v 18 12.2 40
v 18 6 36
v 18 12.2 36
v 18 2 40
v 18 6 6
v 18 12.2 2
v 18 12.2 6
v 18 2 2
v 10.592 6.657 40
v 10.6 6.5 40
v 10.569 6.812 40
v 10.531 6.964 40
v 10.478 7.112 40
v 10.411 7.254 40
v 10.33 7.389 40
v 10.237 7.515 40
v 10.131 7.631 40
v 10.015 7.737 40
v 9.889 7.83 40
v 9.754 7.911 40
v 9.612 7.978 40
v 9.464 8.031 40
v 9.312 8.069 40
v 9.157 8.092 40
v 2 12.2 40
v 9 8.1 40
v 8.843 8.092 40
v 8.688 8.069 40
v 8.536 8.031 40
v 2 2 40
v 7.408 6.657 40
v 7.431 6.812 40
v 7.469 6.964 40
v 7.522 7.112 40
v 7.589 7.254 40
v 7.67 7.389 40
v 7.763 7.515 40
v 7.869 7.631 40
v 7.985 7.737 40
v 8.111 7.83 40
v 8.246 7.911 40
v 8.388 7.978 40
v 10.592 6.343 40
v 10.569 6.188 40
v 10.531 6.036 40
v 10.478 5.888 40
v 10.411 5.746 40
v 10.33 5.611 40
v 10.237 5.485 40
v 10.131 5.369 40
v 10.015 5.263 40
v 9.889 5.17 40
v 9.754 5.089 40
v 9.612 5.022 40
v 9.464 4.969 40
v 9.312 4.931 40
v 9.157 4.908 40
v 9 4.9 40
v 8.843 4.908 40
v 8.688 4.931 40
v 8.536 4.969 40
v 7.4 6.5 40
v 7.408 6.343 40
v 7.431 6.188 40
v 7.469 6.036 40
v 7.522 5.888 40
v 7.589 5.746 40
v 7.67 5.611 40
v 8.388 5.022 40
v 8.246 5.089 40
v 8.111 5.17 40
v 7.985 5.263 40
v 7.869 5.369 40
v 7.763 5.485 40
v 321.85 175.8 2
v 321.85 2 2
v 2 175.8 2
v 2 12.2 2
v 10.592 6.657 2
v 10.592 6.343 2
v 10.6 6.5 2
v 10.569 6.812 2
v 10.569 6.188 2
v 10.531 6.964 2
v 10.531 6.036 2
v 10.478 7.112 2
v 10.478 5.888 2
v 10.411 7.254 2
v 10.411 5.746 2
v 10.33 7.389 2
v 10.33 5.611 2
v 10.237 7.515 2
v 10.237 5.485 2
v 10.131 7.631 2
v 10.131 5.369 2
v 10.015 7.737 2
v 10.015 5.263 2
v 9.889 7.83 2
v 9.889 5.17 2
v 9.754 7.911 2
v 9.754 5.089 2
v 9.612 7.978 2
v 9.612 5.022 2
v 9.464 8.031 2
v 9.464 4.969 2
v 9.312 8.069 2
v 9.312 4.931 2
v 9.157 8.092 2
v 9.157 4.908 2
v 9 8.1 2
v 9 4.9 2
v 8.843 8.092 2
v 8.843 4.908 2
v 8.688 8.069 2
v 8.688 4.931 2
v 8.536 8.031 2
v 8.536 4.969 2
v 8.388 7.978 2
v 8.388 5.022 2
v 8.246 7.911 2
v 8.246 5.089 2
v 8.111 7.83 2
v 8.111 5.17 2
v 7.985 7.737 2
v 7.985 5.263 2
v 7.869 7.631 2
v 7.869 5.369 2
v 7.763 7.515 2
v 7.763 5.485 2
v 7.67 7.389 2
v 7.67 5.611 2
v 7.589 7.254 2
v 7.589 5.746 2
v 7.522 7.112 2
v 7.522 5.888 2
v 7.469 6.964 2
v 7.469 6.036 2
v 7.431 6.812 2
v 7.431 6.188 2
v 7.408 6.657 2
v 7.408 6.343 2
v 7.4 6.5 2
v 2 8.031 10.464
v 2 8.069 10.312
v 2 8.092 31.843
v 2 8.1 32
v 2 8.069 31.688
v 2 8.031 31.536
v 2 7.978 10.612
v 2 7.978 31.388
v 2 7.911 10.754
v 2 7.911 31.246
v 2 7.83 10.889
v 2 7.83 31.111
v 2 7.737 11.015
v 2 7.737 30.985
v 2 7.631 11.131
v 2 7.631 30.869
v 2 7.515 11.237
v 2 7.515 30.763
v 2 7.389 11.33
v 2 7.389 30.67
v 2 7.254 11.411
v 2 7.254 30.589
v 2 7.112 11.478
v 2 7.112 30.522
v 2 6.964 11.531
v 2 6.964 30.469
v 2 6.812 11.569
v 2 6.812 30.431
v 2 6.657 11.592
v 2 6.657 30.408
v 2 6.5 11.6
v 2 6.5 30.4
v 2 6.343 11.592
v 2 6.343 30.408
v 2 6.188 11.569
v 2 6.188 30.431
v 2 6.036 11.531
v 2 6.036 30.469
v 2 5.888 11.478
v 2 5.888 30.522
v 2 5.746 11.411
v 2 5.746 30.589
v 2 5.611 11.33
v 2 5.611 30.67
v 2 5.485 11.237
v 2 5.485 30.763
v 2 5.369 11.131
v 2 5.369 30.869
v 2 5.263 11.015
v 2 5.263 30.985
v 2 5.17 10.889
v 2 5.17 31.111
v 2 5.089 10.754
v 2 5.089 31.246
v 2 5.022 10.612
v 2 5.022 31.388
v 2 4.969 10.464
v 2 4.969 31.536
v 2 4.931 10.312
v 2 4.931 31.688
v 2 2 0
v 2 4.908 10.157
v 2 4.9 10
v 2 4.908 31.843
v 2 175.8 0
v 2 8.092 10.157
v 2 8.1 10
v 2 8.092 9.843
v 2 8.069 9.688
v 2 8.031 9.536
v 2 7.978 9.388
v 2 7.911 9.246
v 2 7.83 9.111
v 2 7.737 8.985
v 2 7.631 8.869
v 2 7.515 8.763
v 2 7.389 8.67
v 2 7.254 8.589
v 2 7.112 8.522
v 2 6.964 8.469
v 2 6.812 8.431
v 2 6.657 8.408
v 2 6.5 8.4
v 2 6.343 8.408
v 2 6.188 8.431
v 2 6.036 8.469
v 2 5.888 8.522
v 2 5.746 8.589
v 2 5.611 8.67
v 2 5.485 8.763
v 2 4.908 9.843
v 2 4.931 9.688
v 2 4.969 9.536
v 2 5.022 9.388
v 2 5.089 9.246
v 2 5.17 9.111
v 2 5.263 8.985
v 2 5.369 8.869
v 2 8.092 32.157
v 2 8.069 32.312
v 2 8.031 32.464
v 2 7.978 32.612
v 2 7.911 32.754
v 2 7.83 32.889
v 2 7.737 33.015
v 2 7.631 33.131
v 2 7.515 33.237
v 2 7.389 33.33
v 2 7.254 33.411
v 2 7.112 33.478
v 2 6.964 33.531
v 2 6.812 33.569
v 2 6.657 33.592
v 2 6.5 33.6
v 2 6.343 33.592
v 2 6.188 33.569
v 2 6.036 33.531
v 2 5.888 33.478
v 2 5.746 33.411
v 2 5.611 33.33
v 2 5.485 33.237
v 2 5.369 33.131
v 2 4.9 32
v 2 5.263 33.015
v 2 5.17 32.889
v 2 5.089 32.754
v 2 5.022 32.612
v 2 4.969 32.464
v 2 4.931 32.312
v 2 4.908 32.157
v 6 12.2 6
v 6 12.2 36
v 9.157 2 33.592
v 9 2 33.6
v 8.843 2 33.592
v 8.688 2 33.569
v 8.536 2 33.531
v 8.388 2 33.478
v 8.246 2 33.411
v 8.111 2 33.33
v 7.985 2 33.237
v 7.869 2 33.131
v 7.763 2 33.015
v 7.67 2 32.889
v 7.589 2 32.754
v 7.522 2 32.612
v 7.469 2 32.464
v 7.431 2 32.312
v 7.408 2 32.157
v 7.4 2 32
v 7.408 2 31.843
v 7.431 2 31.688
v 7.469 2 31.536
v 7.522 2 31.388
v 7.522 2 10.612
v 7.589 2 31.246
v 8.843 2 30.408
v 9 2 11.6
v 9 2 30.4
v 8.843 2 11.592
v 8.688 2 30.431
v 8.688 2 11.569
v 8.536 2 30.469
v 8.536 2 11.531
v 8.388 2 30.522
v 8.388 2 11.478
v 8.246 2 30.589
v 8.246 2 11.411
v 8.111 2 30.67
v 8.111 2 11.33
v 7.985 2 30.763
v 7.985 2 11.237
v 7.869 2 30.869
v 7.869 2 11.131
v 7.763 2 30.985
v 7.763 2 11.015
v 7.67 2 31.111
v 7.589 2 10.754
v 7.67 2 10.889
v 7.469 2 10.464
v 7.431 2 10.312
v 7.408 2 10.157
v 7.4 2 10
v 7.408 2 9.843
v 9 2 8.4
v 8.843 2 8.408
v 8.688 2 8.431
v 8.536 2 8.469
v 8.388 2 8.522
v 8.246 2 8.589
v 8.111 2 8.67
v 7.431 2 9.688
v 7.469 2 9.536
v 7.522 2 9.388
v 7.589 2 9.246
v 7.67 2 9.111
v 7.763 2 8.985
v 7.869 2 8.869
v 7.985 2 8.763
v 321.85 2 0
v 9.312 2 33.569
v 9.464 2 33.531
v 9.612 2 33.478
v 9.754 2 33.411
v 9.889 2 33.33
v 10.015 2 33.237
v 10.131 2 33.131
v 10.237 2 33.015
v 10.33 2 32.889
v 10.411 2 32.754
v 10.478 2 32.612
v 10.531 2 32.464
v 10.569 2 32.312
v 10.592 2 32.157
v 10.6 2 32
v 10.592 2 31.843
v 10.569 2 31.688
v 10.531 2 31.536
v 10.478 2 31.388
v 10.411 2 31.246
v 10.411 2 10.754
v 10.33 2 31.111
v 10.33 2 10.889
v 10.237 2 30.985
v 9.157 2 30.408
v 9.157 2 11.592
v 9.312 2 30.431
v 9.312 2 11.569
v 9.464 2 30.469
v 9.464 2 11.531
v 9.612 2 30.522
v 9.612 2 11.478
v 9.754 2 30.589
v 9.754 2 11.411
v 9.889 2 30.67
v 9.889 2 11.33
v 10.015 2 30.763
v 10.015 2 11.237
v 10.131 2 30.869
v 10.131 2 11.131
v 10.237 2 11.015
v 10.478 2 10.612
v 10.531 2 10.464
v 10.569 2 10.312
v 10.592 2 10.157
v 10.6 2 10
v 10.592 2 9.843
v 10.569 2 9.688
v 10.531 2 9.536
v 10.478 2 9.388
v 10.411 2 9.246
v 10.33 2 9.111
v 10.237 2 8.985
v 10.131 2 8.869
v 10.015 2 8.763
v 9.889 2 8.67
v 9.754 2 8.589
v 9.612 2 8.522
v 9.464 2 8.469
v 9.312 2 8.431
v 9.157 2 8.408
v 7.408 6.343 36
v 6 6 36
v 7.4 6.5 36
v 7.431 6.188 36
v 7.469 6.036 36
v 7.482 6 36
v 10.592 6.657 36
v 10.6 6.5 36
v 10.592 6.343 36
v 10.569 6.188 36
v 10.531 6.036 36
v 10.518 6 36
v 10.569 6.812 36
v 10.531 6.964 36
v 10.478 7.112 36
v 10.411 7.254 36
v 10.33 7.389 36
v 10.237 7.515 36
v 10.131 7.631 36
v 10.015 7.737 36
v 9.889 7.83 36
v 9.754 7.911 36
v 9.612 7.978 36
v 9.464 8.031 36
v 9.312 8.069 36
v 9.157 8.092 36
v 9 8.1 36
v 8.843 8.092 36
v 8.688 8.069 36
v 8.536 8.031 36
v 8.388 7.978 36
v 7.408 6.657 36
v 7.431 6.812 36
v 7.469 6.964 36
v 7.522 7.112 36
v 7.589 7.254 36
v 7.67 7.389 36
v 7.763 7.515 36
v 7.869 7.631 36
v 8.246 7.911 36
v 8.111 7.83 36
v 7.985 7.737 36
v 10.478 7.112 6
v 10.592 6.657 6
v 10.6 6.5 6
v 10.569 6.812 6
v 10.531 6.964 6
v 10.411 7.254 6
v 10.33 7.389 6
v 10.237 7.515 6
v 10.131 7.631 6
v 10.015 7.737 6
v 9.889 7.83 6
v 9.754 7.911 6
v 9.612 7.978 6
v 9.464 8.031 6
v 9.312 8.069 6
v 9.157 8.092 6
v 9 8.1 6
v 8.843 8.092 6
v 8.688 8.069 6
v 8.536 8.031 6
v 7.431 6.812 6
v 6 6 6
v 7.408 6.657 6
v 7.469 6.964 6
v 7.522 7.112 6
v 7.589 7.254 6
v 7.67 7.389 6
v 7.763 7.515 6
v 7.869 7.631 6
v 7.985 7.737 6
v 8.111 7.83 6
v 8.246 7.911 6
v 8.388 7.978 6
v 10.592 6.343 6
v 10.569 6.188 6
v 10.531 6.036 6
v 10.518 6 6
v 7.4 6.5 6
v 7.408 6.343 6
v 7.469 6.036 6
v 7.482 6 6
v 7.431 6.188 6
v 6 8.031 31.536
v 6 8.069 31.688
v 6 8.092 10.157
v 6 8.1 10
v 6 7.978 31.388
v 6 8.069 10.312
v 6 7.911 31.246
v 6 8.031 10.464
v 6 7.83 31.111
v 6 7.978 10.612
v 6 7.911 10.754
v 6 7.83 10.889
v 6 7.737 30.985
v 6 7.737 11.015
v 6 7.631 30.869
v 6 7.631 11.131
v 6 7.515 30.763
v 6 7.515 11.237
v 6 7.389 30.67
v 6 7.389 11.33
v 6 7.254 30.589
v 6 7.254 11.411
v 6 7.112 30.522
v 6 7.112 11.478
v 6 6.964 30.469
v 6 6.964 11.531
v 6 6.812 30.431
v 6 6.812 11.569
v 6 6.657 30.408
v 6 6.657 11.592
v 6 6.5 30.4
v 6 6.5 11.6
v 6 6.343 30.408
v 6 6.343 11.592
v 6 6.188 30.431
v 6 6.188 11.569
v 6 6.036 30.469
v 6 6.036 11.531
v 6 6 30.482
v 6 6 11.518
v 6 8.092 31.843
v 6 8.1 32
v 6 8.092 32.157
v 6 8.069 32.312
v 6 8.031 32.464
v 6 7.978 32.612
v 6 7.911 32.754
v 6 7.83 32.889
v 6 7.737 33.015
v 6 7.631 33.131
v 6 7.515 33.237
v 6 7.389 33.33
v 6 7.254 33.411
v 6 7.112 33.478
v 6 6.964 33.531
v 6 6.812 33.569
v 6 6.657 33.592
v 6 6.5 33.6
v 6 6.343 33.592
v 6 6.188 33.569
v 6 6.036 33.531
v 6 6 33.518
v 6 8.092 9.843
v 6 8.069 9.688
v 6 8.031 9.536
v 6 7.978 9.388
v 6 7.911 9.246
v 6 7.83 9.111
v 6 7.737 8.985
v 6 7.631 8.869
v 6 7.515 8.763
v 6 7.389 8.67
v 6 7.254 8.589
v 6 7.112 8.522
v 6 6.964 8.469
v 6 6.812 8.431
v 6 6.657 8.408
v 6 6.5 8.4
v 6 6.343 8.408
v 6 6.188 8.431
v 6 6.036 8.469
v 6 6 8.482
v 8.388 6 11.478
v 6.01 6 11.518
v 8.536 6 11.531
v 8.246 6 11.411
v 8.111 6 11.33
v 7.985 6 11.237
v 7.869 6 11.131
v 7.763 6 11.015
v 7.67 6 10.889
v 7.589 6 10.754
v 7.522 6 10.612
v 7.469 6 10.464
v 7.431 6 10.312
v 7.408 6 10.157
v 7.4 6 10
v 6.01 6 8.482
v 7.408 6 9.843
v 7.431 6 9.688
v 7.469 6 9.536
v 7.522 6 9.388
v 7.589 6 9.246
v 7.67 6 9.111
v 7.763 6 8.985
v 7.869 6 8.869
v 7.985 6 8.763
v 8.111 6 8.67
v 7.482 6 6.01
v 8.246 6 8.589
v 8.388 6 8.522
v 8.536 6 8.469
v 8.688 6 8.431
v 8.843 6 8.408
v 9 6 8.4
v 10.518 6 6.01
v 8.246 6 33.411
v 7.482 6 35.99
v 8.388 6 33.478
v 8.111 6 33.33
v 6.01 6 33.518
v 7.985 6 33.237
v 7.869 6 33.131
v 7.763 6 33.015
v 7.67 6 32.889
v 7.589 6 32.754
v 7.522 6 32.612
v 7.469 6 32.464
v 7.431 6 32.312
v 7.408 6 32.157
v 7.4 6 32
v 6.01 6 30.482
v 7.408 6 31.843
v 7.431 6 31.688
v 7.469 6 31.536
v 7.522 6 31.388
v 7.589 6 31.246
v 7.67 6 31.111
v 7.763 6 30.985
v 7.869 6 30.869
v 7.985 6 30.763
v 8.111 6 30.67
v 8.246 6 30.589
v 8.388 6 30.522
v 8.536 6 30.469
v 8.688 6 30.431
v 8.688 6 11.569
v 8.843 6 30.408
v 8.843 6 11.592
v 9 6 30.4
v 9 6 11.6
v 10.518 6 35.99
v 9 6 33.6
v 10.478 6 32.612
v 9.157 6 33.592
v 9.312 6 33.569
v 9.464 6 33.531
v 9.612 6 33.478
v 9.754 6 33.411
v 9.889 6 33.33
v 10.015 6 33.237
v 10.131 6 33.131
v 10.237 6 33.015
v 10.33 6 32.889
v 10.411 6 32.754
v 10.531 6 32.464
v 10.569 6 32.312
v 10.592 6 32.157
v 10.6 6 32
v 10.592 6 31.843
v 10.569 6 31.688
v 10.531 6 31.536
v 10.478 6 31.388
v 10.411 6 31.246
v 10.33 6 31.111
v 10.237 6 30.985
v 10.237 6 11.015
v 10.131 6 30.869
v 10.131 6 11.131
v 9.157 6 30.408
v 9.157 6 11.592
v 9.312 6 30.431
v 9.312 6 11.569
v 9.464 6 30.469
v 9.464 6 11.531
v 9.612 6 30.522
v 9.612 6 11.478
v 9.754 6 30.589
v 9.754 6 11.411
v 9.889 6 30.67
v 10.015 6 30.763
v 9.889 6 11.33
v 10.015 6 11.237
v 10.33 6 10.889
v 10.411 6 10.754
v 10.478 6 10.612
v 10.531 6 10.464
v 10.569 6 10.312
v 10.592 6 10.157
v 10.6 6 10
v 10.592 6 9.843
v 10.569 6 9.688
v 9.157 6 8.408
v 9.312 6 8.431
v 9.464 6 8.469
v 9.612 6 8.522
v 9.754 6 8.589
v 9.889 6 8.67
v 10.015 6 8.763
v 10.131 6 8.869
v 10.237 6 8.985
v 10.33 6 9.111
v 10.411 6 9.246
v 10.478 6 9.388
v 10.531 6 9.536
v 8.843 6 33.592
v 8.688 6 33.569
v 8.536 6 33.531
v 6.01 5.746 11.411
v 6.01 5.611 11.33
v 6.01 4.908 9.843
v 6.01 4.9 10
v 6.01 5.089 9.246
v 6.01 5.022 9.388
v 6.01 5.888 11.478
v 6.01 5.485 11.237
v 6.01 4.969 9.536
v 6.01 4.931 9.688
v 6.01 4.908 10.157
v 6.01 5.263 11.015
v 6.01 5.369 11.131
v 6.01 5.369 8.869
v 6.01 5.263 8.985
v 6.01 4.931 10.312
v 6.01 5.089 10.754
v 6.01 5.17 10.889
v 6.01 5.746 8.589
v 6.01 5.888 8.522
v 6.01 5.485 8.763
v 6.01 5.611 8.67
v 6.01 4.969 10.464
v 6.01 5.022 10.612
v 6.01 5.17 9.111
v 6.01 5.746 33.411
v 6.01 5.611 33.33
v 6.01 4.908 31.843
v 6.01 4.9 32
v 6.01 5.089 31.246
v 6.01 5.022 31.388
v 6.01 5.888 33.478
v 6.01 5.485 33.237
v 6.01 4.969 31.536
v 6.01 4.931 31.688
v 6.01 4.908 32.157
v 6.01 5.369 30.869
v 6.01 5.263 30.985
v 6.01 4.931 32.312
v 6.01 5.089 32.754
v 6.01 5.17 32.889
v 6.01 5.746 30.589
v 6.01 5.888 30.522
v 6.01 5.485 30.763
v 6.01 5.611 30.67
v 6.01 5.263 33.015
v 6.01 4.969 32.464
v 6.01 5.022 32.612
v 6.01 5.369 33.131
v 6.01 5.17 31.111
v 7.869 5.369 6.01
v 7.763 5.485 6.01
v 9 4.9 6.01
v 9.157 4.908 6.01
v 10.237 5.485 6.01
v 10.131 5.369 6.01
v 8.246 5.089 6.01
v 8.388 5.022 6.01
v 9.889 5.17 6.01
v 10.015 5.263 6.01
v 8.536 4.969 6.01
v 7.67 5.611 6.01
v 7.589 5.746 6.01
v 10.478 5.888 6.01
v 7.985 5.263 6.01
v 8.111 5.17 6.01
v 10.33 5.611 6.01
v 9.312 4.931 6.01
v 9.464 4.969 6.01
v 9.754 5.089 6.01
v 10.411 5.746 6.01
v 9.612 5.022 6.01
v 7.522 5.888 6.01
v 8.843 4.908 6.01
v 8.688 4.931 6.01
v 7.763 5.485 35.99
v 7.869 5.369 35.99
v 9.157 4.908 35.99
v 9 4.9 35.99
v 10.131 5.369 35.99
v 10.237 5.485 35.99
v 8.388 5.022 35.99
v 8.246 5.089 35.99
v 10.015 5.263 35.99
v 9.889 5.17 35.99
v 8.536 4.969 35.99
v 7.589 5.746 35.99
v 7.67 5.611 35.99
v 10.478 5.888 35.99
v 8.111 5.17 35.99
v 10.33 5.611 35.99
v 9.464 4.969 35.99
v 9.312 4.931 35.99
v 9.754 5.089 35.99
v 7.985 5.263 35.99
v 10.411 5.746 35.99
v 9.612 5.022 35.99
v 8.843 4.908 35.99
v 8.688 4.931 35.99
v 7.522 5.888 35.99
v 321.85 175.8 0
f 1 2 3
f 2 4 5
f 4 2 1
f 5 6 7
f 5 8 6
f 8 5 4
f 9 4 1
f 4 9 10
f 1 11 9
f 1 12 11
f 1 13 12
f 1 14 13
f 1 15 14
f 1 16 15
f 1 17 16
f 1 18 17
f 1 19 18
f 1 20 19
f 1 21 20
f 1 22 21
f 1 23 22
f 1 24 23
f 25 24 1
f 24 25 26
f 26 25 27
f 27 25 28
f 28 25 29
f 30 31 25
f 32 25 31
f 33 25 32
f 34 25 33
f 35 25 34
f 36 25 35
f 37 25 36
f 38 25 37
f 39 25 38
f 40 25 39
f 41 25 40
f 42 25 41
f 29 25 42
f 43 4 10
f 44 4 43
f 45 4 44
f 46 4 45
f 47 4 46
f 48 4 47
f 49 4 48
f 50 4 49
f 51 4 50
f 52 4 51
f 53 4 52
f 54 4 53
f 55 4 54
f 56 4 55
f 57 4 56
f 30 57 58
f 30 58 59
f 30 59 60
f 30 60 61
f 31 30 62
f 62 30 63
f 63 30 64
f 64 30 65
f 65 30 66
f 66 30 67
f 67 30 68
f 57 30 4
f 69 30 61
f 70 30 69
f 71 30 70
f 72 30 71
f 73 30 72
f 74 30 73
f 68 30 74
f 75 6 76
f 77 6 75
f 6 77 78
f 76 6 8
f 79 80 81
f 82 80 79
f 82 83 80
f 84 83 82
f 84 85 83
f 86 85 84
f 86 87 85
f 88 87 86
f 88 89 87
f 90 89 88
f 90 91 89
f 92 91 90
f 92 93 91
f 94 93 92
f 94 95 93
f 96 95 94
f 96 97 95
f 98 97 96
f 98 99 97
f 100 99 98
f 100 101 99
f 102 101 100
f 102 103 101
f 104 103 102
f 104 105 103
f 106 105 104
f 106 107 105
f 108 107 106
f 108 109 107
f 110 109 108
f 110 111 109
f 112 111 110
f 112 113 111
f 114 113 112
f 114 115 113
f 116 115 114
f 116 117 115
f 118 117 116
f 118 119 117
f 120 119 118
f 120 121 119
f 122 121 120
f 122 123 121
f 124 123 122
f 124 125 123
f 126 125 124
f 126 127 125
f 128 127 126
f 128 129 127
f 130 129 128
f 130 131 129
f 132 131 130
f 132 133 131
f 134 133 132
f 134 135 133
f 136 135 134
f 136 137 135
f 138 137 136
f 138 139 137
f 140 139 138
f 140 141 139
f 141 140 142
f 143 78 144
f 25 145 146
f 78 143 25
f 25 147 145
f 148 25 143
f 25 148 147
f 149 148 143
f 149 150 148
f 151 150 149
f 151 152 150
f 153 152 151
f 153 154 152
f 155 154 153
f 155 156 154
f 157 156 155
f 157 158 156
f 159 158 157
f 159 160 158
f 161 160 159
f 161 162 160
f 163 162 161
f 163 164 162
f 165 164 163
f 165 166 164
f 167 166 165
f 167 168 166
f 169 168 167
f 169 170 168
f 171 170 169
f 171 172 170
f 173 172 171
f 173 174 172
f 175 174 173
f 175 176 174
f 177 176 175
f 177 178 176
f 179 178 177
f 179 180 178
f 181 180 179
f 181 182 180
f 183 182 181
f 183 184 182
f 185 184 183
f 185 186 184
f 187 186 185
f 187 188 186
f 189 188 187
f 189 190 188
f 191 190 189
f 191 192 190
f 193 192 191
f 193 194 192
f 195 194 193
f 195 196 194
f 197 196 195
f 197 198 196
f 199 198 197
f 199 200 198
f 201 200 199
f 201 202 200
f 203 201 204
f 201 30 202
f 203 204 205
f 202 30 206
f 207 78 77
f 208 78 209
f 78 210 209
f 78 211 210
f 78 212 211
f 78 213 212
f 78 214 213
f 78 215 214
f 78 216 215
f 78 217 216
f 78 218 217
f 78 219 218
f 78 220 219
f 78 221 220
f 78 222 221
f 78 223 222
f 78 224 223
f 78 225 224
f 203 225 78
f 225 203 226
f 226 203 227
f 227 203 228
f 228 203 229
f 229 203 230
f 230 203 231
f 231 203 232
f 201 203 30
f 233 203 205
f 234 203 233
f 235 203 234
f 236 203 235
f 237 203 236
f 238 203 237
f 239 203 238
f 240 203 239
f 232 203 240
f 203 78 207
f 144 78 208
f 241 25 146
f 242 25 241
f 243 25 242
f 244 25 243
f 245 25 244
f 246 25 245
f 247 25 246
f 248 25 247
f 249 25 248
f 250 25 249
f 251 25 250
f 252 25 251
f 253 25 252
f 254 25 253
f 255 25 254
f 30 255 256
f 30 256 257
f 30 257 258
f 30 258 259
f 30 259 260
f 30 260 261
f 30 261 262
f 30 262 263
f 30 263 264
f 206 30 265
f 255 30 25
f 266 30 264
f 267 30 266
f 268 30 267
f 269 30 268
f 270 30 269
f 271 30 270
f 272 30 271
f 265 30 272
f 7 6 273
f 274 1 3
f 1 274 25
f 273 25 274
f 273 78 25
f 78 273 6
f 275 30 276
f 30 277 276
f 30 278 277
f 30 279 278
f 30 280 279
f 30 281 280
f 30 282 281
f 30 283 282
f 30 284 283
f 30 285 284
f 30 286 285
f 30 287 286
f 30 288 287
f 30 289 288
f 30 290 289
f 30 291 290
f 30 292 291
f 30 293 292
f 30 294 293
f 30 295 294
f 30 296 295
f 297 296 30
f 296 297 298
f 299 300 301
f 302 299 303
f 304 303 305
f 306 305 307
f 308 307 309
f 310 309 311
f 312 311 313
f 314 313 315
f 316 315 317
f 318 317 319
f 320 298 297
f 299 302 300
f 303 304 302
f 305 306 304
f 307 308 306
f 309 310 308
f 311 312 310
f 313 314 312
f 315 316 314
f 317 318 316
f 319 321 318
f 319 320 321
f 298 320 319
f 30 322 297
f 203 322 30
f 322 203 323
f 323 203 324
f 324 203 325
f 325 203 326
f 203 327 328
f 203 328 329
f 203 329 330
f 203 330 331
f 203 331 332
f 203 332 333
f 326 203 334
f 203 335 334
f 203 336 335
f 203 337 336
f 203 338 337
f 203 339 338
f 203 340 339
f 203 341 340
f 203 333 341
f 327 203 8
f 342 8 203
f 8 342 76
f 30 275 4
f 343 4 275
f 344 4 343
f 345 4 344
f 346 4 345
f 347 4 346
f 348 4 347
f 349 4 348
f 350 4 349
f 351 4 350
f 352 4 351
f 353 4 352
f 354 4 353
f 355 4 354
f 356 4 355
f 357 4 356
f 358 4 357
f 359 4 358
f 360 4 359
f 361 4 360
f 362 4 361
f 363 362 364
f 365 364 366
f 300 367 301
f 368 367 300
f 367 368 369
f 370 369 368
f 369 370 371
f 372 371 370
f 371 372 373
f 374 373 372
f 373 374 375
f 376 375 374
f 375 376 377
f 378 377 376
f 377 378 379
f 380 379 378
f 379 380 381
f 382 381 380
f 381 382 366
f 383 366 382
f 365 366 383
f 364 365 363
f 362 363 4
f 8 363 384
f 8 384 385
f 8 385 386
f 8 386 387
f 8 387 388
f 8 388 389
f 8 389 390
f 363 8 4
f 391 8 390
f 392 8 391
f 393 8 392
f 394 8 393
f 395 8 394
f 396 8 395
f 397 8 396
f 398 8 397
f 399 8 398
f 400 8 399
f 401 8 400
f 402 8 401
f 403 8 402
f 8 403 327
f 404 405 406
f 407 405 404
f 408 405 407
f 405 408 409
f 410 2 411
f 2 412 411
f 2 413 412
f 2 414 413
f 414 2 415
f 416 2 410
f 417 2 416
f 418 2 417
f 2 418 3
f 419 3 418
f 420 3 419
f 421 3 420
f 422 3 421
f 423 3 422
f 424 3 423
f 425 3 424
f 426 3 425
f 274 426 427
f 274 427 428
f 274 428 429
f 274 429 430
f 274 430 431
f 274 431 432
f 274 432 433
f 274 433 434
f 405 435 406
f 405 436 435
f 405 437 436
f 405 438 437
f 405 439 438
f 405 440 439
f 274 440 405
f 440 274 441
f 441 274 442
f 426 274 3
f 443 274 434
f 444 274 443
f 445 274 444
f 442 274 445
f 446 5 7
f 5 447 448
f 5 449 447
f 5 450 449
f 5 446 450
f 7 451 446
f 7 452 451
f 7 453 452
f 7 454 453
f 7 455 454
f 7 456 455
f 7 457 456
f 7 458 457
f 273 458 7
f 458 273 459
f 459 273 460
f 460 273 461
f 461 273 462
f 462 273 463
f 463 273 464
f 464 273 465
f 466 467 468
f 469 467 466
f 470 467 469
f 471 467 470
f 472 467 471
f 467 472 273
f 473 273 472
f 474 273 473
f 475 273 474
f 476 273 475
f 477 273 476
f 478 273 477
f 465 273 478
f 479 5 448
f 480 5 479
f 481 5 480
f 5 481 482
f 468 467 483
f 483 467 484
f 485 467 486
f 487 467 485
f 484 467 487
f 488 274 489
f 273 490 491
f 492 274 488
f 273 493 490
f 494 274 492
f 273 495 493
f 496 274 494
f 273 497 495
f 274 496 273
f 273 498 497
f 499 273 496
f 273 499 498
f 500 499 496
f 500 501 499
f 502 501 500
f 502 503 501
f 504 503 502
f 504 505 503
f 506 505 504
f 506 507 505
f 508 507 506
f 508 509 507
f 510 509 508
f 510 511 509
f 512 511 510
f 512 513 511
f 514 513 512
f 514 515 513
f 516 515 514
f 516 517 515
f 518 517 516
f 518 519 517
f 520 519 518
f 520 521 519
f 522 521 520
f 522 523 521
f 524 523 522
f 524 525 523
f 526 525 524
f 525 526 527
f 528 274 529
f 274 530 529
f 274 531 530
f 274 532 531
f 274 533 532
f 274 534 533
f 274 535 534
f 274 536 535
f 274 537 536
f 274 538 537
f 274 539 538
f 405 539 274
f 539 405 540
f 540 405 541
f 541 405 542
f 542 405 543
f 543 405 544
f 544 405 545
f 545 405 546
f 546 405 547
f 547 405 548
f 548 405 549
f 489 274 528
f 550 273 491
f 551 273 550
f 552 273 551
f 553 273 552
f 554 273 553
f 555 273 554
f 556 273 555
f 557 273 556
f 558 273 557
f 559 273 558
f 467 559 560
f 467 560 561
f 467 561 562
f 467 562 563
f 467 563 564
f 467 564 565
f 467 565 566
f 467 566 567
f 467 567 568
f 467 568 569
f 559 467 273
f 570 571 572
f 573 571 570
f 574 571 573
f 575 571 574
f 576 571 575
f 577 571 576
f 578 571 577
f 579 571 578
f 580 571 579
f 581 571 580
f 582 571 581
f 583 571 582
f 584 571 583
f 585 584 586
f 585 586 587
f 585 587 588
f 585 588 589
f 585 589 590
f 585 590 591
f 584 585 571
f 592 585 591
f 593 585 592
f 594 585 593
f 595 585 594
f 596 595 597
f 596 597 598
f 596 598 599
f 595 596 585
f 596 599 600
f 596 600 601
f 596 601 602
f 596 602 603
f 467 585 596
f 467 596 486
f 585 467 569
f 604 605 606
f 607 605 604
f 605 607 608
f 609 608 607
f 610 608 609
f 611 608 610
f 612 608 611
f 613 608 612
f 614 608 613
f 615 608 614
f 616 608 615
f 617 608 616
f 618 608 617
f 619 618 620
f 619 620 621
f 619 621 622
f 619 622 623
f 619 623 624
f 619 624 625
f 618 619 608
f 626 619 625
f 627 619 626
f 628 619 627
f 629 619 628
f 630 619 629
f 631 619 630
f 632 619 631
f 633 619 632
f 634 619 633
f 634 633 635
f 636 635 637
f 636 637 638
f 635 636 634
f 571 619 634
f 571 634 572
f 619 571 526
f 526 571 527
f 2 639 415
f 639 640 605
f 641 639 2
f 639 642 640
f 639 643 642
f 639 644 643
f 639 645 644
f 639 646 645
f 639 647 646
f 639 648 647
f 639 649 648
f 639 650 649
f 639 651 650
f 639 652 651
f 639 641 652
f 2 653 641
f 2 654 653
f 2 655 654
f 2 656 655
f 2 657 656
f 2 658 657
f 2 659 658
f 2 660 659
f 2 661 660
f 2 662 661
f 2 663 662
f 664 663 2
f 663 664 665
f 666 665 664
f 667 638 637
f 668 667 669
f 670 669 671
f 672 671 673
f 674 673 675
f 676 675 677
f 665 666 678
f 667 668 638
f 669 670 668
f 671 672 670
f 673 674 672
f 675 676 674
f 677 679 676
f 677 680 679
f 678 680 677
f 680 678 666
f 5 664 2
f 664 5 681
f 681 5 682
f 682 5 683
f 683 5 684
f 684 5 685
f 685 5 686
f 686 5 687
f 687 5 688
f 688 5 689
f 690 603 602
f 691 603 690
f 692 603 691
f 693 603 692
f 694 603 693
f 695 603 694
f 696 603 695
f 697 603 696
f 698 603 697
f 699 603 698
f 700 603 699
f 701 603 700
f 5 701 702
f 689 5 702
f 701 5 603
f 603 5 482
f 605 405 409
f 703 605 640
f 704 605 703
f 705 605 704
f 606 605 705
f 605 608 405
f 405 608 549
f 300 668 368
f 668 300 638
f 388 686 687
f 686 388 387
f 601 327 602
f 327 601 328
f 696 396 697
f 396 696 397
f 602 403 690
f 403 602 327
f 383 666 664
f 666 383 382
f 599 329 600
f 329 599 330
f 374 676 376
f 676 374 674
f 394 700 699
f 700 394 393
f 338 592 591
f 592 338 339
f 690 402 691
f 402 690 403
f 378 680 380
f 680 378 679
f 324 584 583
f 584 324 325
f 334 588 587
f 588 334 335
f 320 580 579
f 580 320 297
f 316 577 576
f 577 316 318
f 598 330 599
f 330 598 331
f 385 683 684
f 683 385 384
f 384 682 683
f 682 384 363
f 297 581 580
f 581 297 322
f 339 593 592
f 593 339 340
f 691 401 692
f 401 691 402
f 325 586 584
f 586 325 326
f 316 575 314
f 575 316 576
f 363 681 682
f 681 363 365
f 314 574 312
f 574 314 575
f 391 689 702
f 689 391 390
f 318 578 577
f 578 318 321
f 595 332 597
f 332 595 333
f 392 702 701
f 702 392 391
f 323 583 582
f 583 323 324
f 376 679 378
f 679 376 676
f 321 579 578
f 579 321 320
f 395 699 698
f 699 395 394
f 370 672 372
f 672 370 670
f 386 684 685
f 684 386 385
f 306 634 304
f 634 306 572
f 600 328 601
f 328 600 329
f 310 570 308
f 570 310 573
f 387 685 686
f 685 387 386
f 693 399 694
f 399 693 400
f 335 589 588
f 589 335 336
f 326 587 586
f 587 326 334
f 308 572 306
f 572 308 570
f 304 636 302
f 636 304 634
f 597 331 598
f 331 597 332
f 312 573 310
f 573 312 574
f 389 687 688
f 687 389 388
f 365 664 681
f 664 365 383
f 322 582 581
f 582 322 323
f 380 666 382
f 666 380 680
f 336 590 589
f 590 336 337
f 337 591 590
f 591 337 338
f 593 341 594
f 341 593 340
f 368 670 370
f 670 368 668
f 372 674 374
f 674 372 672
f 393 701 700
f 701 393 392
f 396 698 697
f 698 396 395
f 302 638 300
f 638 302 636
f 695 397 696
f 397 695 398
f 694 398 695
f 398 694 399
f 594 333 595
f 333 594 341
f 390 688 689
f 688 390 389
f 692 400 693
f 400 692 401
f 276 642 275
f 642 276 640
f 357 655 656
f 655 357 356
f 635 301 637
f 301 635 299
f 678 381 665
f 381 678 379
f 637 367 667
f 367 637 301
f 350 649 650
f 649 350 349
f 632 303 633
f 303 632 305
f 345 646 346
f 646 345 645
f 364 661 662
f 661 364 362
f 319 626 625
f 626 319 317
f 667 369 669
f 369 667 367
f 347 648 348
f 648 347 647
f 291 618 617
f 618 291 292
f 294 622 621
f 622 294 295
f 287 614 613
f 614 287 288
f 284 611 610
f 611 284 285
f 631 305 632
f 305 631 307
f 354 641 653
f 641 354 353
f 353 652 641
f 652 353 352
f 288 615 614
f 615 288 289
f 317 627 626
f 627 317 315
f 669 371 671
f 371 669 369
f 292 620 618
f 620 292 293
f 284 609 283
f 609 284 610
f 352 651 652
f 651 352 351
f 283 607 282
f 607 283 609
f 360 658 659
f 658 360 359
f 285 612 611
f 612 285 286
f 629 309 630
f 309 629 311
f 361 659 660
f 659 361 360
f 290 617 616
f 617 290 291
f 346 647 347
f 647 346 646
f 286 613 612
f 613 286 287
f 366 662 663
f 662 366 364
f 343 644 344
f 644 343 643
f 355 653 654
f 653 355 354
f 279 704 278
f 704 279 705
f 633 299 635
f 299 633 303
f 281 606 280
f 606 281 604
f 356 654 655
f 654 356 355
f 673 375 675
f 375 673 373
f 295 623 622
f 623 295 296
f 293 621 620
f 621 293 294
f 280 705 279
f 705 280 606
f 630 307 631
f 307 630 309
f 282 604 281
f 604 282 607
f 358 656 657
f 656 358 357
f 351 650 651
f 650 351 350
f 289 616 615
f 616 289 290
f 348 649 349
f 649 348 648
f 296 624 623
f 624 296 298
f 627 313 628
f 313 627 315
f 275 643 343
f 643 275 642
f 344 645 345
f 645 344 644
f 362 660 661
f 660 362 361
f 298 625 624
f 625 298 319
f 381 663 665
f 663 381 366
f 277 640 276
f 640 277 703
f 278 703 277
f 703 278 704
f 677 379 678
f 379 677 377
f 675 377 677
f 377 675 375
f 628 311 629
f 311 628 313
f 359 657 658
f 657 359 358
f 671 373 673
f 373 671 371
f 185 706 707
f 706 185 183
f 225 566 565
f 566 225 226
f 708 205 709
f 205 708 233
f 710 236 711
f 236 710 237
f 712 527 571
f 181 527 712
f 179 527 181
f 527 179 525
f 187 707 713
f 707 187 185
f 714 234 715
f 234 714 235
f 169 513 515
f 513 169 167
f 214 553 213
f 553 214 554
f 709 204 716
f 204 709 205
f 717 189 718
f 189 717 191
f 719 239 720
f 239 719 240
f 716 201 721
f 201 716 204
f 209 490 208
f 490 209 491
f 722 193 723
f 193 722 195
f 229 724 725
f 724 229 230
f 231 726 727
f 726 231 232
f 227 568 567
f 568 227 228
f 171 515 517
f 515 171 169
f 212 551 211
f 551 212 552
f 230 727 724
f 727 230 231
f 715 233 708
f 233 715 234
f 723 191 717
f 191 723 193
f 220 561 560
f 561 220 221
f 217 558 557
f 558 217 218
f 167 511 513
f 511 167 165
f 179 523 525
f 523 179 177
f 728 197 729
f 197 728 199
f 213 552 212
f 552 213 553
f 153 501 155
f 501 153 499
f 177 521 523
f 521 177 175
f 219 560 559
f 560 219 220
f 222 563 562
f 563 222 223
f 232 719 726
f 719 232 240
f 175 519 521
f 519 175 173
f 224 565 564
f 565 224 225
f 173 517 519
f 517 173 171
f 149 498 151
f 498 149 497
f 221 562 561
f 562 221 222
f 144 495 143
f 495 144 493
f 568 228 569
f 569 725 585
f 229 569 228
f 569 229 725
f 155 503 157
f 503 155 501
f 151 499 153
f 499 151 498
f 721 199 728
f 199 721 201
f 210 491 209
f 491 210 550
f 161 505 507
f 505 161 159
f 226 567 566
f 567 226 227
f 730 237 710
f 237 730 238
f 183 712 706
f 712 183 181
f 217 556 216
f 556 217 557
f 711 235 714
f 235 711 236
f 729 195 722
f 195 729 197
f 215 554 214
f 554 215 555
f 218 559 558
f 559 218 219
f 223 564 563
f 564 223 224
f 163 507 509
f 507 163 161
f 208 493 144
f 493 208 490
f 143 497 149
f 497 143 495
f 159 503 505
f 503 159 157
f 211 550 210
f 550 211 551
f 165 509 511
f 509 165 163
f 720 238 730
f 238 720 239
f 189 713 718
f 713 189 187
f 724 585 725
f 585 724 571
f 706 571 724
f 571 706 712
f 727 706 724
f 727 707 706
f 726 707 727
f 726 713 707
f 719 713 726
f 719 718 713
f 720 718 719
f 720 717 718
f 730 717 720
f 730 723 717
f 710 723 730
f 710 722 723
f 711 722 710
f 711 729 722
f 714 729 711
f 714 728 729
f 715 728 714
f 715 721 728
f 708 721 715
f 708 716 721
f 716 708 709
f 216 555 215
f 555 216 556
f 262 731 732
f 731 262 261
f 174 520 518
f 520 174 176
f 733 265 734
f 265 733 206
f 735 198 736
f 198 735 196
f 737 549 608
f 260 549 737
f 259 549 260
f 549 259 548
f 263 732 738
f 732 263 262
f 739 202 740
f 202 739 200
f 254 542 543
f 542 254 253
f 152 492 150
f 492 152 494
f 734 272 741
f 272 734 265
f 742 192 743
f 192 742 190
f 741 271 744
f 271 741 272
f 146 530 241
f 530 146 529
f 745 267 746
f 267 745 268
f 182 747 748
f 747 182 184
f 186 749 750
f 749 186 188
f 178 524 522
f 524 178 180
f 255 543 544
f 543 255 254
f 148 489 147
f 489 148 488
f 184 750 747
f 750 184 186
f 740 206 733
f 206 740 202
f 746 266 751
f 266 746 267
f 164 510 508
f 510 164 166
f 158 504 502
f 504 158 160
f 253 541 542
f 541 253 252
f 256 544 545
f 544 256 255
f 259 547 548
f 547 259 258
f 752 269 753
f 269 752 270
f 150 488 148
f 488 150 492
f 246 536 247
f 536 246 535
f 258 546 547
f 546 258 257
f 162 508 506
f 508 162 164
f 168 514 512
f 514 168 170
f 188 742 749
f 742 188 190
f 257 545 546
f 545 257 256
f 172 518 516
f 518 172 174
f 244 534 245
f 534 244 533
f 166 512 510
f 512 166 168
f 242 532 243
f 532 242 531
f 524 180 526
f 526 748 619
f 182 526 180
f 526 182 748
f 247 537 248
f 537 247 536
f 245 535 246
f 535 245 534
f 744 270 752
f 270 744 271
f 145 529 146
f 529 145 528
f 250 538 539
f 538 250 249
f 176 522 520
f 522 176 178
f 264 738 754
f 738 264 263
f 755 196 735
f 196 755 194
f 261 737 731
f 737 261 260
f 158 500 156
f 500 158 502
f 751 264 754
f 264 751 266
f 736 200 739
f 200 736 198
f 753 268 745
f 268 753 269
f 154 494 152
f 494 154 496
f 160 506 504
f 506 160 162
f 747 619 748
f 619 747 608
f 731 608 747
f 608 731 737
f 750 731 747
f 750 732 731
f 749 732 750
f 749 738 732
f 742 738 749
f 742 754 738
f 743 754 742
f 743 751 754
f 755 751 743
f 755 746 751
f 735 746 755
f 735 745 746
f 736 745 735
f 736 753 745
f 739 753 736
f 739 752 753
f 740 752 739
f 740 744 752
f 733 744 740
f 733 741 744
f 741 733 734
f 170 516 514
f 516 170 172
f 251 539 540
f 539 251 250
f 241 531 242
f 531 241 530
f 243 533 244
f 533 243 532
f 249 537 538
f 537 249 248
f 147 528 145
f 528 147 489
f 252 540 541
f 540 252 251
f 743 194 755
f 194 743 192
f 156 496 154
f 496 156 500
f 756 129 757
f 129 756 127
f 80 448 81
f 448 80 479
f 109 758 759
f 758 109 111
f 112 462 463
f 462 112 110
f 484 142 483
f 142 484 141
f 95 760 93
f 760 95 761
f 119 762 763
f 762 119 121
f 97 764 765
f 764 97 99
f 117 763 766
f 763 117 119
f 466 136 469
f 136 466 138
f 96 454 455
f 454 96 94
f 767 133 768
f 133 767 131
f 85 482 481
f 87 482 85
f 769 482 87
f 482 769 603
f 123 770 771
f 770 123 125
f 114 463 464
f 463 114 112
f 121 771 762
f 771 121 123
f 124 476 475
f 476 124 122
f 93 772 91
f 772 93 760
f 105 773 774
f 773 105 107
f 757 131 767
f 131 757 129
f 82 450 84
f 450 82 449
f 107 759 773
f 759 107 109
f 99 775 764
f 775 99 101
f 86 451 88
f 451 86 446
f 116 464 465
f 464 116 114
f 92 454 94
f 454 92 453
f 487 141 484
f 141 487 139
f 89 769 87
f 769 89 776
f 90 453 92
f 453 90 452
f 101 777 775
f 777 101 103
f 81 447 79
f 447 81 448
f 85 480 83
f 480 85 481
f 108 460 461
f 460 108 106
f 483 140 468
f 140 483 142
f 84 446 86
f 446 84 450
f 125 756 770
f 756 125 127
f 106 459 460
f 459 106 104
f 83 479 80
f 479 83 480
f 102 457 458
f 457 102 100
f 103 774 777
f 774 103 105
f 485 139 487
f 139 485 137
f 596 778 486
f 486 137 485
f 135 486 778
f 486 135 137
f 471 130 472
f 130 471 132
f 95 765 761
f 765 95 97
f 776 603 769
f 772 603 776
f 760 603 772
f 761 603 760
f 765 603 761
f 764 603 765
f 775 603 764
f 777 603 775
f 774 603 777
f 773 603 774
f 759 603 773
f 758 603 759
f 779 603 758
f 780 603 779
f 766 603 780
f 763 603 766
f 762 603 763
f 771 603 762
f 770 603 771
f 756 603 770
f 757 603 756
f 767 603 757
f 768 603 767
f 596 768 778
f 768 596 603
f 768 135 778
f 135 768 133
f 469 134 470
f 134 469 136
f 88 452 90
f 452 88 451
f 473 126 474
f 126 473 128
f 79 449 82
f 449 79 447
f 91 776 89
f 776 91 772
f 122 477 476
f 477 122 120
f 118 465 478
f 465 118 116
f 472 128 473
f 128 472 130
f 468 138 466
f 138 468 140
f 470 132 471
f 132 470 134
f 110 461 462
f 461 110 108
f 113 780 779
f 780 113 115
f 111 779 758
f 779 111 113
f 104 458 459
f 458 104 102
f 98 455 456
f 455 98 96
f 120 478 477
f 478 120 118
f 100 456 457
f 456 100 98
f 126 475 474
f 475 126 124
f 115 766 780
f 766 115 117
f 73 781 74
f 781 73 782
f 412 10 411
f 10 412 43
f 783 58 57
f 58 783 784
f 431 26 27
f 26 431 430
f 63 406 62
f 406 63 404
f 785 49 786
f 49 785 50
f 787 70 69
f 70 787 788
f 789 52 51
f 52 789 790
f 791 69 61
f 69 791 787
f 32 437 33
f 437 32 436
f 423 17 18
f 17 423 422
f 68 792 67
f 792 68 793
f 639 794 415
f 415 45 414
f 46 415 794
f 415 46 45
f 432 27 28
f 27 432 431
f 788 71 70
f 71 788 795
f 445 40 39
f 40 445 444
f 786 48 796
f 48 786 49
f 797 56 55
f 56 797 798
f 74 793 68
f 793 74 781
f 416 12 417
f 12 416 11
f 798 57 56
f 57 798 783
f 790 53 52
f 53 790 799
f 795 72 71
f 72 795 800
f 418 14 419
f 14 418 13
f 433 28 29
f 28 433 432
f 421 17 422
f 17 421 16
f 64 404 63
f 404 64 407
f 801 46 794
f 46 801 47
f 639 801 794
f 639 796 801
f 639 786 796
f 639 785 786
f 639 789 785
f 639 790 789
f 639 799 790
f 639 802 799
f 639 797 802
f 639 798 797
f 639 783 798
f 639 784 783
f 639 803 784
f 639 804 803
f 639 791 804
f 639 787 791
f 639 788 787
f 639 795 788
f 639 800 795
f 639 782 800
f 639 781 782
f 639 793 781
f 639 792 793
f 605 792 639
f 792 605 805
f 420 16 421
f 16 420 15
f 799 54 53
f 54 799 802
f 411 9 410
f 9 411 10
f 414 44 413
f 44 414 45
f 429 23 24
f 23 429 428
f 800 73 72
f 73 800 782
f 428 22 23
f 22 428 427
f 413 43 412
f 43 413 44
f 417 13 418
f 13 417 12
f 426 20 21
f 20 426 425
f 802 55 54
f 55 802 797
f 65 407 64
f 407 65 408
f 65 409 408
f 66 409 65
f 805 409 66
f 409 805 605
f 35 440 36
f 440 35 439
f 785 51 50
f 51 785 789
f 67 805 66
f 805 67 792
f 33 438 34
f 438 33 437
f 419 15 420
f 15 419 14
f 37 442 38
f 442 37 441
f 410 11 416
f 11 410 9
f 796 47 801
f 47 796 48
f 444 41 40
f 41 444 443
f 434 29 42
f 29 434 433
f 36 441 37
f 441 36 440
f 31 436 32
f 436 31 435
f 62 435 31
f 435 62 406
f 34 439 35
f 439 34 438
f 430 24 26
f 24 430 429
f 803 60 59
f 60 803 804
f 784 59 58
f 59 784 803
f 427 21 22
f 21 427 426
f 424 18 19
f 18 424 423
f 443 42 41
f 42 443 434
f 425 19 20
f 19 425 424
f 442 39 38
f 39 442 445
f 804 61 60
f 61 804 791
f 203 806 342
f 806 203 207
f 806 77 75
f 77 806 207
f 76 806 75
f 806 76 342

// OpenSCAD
$fn = 64;

ds = 2;
dvh = [9, 6.5];

s = [dvh.x * 2 - ds, 12.2 - ds, 42 - ds * 2];

dx = 0.01;
m3 = 3.2;

wl = 4;

module col() {
	color("#FFEEEE")
	difference() {
		cube(s);
		
		translate([wl, wl, wl])
		cube([s.x, s.y, s.z - 2 * wl]);
		
		translate([dvh.x - ds, -dx, s.x / 2])
		rotate([-90, 0, 0])
		linear_extrude(wl + 2 * dx)
		circle(d=m3);
		
		translate([dvh.x - ds, -dx, s.z - s.x / 2])
		rotate([-90, 0, 0])
		linear_extrude(wl + 2 * dx)
		circle(d=m3);
		
		translate([-dx, dvh.y - ds, s.x / 2])
		rotate([0, 90, 0])
		linear_extrude(wl + 2 * dx)
		circle(d=m3);
		
		translate([-dx, dvh.y - ds, s.z - s.x / 2])
		rotate([0, 90, 0])
		linear_extrude(wl + 2 * dx)
		circle(d=m3);
		
		translate([dvh.x - ds, dvh.y - ds, -dx])
		linear_extrude(wl + 2 * dx)
		circle(d=m3);

		translate([dvh.x - ds, dvh.y - ds, s.z - dx - wl])
		linear_extrude(wl + 2 * dx)
		circle(d=m3);
	}
}

module sheet(s) {
	color("#EEFFEE")
	linear_extrude(ds)
	square(s);
}


translate([ds, ds, ds])
col();


// Bottom:
translate([ds, ds])
sheet([
	25.4 * 4.25 * 3 - 2 * ds,
	25.4 * 7 - 2 * ds
]);
